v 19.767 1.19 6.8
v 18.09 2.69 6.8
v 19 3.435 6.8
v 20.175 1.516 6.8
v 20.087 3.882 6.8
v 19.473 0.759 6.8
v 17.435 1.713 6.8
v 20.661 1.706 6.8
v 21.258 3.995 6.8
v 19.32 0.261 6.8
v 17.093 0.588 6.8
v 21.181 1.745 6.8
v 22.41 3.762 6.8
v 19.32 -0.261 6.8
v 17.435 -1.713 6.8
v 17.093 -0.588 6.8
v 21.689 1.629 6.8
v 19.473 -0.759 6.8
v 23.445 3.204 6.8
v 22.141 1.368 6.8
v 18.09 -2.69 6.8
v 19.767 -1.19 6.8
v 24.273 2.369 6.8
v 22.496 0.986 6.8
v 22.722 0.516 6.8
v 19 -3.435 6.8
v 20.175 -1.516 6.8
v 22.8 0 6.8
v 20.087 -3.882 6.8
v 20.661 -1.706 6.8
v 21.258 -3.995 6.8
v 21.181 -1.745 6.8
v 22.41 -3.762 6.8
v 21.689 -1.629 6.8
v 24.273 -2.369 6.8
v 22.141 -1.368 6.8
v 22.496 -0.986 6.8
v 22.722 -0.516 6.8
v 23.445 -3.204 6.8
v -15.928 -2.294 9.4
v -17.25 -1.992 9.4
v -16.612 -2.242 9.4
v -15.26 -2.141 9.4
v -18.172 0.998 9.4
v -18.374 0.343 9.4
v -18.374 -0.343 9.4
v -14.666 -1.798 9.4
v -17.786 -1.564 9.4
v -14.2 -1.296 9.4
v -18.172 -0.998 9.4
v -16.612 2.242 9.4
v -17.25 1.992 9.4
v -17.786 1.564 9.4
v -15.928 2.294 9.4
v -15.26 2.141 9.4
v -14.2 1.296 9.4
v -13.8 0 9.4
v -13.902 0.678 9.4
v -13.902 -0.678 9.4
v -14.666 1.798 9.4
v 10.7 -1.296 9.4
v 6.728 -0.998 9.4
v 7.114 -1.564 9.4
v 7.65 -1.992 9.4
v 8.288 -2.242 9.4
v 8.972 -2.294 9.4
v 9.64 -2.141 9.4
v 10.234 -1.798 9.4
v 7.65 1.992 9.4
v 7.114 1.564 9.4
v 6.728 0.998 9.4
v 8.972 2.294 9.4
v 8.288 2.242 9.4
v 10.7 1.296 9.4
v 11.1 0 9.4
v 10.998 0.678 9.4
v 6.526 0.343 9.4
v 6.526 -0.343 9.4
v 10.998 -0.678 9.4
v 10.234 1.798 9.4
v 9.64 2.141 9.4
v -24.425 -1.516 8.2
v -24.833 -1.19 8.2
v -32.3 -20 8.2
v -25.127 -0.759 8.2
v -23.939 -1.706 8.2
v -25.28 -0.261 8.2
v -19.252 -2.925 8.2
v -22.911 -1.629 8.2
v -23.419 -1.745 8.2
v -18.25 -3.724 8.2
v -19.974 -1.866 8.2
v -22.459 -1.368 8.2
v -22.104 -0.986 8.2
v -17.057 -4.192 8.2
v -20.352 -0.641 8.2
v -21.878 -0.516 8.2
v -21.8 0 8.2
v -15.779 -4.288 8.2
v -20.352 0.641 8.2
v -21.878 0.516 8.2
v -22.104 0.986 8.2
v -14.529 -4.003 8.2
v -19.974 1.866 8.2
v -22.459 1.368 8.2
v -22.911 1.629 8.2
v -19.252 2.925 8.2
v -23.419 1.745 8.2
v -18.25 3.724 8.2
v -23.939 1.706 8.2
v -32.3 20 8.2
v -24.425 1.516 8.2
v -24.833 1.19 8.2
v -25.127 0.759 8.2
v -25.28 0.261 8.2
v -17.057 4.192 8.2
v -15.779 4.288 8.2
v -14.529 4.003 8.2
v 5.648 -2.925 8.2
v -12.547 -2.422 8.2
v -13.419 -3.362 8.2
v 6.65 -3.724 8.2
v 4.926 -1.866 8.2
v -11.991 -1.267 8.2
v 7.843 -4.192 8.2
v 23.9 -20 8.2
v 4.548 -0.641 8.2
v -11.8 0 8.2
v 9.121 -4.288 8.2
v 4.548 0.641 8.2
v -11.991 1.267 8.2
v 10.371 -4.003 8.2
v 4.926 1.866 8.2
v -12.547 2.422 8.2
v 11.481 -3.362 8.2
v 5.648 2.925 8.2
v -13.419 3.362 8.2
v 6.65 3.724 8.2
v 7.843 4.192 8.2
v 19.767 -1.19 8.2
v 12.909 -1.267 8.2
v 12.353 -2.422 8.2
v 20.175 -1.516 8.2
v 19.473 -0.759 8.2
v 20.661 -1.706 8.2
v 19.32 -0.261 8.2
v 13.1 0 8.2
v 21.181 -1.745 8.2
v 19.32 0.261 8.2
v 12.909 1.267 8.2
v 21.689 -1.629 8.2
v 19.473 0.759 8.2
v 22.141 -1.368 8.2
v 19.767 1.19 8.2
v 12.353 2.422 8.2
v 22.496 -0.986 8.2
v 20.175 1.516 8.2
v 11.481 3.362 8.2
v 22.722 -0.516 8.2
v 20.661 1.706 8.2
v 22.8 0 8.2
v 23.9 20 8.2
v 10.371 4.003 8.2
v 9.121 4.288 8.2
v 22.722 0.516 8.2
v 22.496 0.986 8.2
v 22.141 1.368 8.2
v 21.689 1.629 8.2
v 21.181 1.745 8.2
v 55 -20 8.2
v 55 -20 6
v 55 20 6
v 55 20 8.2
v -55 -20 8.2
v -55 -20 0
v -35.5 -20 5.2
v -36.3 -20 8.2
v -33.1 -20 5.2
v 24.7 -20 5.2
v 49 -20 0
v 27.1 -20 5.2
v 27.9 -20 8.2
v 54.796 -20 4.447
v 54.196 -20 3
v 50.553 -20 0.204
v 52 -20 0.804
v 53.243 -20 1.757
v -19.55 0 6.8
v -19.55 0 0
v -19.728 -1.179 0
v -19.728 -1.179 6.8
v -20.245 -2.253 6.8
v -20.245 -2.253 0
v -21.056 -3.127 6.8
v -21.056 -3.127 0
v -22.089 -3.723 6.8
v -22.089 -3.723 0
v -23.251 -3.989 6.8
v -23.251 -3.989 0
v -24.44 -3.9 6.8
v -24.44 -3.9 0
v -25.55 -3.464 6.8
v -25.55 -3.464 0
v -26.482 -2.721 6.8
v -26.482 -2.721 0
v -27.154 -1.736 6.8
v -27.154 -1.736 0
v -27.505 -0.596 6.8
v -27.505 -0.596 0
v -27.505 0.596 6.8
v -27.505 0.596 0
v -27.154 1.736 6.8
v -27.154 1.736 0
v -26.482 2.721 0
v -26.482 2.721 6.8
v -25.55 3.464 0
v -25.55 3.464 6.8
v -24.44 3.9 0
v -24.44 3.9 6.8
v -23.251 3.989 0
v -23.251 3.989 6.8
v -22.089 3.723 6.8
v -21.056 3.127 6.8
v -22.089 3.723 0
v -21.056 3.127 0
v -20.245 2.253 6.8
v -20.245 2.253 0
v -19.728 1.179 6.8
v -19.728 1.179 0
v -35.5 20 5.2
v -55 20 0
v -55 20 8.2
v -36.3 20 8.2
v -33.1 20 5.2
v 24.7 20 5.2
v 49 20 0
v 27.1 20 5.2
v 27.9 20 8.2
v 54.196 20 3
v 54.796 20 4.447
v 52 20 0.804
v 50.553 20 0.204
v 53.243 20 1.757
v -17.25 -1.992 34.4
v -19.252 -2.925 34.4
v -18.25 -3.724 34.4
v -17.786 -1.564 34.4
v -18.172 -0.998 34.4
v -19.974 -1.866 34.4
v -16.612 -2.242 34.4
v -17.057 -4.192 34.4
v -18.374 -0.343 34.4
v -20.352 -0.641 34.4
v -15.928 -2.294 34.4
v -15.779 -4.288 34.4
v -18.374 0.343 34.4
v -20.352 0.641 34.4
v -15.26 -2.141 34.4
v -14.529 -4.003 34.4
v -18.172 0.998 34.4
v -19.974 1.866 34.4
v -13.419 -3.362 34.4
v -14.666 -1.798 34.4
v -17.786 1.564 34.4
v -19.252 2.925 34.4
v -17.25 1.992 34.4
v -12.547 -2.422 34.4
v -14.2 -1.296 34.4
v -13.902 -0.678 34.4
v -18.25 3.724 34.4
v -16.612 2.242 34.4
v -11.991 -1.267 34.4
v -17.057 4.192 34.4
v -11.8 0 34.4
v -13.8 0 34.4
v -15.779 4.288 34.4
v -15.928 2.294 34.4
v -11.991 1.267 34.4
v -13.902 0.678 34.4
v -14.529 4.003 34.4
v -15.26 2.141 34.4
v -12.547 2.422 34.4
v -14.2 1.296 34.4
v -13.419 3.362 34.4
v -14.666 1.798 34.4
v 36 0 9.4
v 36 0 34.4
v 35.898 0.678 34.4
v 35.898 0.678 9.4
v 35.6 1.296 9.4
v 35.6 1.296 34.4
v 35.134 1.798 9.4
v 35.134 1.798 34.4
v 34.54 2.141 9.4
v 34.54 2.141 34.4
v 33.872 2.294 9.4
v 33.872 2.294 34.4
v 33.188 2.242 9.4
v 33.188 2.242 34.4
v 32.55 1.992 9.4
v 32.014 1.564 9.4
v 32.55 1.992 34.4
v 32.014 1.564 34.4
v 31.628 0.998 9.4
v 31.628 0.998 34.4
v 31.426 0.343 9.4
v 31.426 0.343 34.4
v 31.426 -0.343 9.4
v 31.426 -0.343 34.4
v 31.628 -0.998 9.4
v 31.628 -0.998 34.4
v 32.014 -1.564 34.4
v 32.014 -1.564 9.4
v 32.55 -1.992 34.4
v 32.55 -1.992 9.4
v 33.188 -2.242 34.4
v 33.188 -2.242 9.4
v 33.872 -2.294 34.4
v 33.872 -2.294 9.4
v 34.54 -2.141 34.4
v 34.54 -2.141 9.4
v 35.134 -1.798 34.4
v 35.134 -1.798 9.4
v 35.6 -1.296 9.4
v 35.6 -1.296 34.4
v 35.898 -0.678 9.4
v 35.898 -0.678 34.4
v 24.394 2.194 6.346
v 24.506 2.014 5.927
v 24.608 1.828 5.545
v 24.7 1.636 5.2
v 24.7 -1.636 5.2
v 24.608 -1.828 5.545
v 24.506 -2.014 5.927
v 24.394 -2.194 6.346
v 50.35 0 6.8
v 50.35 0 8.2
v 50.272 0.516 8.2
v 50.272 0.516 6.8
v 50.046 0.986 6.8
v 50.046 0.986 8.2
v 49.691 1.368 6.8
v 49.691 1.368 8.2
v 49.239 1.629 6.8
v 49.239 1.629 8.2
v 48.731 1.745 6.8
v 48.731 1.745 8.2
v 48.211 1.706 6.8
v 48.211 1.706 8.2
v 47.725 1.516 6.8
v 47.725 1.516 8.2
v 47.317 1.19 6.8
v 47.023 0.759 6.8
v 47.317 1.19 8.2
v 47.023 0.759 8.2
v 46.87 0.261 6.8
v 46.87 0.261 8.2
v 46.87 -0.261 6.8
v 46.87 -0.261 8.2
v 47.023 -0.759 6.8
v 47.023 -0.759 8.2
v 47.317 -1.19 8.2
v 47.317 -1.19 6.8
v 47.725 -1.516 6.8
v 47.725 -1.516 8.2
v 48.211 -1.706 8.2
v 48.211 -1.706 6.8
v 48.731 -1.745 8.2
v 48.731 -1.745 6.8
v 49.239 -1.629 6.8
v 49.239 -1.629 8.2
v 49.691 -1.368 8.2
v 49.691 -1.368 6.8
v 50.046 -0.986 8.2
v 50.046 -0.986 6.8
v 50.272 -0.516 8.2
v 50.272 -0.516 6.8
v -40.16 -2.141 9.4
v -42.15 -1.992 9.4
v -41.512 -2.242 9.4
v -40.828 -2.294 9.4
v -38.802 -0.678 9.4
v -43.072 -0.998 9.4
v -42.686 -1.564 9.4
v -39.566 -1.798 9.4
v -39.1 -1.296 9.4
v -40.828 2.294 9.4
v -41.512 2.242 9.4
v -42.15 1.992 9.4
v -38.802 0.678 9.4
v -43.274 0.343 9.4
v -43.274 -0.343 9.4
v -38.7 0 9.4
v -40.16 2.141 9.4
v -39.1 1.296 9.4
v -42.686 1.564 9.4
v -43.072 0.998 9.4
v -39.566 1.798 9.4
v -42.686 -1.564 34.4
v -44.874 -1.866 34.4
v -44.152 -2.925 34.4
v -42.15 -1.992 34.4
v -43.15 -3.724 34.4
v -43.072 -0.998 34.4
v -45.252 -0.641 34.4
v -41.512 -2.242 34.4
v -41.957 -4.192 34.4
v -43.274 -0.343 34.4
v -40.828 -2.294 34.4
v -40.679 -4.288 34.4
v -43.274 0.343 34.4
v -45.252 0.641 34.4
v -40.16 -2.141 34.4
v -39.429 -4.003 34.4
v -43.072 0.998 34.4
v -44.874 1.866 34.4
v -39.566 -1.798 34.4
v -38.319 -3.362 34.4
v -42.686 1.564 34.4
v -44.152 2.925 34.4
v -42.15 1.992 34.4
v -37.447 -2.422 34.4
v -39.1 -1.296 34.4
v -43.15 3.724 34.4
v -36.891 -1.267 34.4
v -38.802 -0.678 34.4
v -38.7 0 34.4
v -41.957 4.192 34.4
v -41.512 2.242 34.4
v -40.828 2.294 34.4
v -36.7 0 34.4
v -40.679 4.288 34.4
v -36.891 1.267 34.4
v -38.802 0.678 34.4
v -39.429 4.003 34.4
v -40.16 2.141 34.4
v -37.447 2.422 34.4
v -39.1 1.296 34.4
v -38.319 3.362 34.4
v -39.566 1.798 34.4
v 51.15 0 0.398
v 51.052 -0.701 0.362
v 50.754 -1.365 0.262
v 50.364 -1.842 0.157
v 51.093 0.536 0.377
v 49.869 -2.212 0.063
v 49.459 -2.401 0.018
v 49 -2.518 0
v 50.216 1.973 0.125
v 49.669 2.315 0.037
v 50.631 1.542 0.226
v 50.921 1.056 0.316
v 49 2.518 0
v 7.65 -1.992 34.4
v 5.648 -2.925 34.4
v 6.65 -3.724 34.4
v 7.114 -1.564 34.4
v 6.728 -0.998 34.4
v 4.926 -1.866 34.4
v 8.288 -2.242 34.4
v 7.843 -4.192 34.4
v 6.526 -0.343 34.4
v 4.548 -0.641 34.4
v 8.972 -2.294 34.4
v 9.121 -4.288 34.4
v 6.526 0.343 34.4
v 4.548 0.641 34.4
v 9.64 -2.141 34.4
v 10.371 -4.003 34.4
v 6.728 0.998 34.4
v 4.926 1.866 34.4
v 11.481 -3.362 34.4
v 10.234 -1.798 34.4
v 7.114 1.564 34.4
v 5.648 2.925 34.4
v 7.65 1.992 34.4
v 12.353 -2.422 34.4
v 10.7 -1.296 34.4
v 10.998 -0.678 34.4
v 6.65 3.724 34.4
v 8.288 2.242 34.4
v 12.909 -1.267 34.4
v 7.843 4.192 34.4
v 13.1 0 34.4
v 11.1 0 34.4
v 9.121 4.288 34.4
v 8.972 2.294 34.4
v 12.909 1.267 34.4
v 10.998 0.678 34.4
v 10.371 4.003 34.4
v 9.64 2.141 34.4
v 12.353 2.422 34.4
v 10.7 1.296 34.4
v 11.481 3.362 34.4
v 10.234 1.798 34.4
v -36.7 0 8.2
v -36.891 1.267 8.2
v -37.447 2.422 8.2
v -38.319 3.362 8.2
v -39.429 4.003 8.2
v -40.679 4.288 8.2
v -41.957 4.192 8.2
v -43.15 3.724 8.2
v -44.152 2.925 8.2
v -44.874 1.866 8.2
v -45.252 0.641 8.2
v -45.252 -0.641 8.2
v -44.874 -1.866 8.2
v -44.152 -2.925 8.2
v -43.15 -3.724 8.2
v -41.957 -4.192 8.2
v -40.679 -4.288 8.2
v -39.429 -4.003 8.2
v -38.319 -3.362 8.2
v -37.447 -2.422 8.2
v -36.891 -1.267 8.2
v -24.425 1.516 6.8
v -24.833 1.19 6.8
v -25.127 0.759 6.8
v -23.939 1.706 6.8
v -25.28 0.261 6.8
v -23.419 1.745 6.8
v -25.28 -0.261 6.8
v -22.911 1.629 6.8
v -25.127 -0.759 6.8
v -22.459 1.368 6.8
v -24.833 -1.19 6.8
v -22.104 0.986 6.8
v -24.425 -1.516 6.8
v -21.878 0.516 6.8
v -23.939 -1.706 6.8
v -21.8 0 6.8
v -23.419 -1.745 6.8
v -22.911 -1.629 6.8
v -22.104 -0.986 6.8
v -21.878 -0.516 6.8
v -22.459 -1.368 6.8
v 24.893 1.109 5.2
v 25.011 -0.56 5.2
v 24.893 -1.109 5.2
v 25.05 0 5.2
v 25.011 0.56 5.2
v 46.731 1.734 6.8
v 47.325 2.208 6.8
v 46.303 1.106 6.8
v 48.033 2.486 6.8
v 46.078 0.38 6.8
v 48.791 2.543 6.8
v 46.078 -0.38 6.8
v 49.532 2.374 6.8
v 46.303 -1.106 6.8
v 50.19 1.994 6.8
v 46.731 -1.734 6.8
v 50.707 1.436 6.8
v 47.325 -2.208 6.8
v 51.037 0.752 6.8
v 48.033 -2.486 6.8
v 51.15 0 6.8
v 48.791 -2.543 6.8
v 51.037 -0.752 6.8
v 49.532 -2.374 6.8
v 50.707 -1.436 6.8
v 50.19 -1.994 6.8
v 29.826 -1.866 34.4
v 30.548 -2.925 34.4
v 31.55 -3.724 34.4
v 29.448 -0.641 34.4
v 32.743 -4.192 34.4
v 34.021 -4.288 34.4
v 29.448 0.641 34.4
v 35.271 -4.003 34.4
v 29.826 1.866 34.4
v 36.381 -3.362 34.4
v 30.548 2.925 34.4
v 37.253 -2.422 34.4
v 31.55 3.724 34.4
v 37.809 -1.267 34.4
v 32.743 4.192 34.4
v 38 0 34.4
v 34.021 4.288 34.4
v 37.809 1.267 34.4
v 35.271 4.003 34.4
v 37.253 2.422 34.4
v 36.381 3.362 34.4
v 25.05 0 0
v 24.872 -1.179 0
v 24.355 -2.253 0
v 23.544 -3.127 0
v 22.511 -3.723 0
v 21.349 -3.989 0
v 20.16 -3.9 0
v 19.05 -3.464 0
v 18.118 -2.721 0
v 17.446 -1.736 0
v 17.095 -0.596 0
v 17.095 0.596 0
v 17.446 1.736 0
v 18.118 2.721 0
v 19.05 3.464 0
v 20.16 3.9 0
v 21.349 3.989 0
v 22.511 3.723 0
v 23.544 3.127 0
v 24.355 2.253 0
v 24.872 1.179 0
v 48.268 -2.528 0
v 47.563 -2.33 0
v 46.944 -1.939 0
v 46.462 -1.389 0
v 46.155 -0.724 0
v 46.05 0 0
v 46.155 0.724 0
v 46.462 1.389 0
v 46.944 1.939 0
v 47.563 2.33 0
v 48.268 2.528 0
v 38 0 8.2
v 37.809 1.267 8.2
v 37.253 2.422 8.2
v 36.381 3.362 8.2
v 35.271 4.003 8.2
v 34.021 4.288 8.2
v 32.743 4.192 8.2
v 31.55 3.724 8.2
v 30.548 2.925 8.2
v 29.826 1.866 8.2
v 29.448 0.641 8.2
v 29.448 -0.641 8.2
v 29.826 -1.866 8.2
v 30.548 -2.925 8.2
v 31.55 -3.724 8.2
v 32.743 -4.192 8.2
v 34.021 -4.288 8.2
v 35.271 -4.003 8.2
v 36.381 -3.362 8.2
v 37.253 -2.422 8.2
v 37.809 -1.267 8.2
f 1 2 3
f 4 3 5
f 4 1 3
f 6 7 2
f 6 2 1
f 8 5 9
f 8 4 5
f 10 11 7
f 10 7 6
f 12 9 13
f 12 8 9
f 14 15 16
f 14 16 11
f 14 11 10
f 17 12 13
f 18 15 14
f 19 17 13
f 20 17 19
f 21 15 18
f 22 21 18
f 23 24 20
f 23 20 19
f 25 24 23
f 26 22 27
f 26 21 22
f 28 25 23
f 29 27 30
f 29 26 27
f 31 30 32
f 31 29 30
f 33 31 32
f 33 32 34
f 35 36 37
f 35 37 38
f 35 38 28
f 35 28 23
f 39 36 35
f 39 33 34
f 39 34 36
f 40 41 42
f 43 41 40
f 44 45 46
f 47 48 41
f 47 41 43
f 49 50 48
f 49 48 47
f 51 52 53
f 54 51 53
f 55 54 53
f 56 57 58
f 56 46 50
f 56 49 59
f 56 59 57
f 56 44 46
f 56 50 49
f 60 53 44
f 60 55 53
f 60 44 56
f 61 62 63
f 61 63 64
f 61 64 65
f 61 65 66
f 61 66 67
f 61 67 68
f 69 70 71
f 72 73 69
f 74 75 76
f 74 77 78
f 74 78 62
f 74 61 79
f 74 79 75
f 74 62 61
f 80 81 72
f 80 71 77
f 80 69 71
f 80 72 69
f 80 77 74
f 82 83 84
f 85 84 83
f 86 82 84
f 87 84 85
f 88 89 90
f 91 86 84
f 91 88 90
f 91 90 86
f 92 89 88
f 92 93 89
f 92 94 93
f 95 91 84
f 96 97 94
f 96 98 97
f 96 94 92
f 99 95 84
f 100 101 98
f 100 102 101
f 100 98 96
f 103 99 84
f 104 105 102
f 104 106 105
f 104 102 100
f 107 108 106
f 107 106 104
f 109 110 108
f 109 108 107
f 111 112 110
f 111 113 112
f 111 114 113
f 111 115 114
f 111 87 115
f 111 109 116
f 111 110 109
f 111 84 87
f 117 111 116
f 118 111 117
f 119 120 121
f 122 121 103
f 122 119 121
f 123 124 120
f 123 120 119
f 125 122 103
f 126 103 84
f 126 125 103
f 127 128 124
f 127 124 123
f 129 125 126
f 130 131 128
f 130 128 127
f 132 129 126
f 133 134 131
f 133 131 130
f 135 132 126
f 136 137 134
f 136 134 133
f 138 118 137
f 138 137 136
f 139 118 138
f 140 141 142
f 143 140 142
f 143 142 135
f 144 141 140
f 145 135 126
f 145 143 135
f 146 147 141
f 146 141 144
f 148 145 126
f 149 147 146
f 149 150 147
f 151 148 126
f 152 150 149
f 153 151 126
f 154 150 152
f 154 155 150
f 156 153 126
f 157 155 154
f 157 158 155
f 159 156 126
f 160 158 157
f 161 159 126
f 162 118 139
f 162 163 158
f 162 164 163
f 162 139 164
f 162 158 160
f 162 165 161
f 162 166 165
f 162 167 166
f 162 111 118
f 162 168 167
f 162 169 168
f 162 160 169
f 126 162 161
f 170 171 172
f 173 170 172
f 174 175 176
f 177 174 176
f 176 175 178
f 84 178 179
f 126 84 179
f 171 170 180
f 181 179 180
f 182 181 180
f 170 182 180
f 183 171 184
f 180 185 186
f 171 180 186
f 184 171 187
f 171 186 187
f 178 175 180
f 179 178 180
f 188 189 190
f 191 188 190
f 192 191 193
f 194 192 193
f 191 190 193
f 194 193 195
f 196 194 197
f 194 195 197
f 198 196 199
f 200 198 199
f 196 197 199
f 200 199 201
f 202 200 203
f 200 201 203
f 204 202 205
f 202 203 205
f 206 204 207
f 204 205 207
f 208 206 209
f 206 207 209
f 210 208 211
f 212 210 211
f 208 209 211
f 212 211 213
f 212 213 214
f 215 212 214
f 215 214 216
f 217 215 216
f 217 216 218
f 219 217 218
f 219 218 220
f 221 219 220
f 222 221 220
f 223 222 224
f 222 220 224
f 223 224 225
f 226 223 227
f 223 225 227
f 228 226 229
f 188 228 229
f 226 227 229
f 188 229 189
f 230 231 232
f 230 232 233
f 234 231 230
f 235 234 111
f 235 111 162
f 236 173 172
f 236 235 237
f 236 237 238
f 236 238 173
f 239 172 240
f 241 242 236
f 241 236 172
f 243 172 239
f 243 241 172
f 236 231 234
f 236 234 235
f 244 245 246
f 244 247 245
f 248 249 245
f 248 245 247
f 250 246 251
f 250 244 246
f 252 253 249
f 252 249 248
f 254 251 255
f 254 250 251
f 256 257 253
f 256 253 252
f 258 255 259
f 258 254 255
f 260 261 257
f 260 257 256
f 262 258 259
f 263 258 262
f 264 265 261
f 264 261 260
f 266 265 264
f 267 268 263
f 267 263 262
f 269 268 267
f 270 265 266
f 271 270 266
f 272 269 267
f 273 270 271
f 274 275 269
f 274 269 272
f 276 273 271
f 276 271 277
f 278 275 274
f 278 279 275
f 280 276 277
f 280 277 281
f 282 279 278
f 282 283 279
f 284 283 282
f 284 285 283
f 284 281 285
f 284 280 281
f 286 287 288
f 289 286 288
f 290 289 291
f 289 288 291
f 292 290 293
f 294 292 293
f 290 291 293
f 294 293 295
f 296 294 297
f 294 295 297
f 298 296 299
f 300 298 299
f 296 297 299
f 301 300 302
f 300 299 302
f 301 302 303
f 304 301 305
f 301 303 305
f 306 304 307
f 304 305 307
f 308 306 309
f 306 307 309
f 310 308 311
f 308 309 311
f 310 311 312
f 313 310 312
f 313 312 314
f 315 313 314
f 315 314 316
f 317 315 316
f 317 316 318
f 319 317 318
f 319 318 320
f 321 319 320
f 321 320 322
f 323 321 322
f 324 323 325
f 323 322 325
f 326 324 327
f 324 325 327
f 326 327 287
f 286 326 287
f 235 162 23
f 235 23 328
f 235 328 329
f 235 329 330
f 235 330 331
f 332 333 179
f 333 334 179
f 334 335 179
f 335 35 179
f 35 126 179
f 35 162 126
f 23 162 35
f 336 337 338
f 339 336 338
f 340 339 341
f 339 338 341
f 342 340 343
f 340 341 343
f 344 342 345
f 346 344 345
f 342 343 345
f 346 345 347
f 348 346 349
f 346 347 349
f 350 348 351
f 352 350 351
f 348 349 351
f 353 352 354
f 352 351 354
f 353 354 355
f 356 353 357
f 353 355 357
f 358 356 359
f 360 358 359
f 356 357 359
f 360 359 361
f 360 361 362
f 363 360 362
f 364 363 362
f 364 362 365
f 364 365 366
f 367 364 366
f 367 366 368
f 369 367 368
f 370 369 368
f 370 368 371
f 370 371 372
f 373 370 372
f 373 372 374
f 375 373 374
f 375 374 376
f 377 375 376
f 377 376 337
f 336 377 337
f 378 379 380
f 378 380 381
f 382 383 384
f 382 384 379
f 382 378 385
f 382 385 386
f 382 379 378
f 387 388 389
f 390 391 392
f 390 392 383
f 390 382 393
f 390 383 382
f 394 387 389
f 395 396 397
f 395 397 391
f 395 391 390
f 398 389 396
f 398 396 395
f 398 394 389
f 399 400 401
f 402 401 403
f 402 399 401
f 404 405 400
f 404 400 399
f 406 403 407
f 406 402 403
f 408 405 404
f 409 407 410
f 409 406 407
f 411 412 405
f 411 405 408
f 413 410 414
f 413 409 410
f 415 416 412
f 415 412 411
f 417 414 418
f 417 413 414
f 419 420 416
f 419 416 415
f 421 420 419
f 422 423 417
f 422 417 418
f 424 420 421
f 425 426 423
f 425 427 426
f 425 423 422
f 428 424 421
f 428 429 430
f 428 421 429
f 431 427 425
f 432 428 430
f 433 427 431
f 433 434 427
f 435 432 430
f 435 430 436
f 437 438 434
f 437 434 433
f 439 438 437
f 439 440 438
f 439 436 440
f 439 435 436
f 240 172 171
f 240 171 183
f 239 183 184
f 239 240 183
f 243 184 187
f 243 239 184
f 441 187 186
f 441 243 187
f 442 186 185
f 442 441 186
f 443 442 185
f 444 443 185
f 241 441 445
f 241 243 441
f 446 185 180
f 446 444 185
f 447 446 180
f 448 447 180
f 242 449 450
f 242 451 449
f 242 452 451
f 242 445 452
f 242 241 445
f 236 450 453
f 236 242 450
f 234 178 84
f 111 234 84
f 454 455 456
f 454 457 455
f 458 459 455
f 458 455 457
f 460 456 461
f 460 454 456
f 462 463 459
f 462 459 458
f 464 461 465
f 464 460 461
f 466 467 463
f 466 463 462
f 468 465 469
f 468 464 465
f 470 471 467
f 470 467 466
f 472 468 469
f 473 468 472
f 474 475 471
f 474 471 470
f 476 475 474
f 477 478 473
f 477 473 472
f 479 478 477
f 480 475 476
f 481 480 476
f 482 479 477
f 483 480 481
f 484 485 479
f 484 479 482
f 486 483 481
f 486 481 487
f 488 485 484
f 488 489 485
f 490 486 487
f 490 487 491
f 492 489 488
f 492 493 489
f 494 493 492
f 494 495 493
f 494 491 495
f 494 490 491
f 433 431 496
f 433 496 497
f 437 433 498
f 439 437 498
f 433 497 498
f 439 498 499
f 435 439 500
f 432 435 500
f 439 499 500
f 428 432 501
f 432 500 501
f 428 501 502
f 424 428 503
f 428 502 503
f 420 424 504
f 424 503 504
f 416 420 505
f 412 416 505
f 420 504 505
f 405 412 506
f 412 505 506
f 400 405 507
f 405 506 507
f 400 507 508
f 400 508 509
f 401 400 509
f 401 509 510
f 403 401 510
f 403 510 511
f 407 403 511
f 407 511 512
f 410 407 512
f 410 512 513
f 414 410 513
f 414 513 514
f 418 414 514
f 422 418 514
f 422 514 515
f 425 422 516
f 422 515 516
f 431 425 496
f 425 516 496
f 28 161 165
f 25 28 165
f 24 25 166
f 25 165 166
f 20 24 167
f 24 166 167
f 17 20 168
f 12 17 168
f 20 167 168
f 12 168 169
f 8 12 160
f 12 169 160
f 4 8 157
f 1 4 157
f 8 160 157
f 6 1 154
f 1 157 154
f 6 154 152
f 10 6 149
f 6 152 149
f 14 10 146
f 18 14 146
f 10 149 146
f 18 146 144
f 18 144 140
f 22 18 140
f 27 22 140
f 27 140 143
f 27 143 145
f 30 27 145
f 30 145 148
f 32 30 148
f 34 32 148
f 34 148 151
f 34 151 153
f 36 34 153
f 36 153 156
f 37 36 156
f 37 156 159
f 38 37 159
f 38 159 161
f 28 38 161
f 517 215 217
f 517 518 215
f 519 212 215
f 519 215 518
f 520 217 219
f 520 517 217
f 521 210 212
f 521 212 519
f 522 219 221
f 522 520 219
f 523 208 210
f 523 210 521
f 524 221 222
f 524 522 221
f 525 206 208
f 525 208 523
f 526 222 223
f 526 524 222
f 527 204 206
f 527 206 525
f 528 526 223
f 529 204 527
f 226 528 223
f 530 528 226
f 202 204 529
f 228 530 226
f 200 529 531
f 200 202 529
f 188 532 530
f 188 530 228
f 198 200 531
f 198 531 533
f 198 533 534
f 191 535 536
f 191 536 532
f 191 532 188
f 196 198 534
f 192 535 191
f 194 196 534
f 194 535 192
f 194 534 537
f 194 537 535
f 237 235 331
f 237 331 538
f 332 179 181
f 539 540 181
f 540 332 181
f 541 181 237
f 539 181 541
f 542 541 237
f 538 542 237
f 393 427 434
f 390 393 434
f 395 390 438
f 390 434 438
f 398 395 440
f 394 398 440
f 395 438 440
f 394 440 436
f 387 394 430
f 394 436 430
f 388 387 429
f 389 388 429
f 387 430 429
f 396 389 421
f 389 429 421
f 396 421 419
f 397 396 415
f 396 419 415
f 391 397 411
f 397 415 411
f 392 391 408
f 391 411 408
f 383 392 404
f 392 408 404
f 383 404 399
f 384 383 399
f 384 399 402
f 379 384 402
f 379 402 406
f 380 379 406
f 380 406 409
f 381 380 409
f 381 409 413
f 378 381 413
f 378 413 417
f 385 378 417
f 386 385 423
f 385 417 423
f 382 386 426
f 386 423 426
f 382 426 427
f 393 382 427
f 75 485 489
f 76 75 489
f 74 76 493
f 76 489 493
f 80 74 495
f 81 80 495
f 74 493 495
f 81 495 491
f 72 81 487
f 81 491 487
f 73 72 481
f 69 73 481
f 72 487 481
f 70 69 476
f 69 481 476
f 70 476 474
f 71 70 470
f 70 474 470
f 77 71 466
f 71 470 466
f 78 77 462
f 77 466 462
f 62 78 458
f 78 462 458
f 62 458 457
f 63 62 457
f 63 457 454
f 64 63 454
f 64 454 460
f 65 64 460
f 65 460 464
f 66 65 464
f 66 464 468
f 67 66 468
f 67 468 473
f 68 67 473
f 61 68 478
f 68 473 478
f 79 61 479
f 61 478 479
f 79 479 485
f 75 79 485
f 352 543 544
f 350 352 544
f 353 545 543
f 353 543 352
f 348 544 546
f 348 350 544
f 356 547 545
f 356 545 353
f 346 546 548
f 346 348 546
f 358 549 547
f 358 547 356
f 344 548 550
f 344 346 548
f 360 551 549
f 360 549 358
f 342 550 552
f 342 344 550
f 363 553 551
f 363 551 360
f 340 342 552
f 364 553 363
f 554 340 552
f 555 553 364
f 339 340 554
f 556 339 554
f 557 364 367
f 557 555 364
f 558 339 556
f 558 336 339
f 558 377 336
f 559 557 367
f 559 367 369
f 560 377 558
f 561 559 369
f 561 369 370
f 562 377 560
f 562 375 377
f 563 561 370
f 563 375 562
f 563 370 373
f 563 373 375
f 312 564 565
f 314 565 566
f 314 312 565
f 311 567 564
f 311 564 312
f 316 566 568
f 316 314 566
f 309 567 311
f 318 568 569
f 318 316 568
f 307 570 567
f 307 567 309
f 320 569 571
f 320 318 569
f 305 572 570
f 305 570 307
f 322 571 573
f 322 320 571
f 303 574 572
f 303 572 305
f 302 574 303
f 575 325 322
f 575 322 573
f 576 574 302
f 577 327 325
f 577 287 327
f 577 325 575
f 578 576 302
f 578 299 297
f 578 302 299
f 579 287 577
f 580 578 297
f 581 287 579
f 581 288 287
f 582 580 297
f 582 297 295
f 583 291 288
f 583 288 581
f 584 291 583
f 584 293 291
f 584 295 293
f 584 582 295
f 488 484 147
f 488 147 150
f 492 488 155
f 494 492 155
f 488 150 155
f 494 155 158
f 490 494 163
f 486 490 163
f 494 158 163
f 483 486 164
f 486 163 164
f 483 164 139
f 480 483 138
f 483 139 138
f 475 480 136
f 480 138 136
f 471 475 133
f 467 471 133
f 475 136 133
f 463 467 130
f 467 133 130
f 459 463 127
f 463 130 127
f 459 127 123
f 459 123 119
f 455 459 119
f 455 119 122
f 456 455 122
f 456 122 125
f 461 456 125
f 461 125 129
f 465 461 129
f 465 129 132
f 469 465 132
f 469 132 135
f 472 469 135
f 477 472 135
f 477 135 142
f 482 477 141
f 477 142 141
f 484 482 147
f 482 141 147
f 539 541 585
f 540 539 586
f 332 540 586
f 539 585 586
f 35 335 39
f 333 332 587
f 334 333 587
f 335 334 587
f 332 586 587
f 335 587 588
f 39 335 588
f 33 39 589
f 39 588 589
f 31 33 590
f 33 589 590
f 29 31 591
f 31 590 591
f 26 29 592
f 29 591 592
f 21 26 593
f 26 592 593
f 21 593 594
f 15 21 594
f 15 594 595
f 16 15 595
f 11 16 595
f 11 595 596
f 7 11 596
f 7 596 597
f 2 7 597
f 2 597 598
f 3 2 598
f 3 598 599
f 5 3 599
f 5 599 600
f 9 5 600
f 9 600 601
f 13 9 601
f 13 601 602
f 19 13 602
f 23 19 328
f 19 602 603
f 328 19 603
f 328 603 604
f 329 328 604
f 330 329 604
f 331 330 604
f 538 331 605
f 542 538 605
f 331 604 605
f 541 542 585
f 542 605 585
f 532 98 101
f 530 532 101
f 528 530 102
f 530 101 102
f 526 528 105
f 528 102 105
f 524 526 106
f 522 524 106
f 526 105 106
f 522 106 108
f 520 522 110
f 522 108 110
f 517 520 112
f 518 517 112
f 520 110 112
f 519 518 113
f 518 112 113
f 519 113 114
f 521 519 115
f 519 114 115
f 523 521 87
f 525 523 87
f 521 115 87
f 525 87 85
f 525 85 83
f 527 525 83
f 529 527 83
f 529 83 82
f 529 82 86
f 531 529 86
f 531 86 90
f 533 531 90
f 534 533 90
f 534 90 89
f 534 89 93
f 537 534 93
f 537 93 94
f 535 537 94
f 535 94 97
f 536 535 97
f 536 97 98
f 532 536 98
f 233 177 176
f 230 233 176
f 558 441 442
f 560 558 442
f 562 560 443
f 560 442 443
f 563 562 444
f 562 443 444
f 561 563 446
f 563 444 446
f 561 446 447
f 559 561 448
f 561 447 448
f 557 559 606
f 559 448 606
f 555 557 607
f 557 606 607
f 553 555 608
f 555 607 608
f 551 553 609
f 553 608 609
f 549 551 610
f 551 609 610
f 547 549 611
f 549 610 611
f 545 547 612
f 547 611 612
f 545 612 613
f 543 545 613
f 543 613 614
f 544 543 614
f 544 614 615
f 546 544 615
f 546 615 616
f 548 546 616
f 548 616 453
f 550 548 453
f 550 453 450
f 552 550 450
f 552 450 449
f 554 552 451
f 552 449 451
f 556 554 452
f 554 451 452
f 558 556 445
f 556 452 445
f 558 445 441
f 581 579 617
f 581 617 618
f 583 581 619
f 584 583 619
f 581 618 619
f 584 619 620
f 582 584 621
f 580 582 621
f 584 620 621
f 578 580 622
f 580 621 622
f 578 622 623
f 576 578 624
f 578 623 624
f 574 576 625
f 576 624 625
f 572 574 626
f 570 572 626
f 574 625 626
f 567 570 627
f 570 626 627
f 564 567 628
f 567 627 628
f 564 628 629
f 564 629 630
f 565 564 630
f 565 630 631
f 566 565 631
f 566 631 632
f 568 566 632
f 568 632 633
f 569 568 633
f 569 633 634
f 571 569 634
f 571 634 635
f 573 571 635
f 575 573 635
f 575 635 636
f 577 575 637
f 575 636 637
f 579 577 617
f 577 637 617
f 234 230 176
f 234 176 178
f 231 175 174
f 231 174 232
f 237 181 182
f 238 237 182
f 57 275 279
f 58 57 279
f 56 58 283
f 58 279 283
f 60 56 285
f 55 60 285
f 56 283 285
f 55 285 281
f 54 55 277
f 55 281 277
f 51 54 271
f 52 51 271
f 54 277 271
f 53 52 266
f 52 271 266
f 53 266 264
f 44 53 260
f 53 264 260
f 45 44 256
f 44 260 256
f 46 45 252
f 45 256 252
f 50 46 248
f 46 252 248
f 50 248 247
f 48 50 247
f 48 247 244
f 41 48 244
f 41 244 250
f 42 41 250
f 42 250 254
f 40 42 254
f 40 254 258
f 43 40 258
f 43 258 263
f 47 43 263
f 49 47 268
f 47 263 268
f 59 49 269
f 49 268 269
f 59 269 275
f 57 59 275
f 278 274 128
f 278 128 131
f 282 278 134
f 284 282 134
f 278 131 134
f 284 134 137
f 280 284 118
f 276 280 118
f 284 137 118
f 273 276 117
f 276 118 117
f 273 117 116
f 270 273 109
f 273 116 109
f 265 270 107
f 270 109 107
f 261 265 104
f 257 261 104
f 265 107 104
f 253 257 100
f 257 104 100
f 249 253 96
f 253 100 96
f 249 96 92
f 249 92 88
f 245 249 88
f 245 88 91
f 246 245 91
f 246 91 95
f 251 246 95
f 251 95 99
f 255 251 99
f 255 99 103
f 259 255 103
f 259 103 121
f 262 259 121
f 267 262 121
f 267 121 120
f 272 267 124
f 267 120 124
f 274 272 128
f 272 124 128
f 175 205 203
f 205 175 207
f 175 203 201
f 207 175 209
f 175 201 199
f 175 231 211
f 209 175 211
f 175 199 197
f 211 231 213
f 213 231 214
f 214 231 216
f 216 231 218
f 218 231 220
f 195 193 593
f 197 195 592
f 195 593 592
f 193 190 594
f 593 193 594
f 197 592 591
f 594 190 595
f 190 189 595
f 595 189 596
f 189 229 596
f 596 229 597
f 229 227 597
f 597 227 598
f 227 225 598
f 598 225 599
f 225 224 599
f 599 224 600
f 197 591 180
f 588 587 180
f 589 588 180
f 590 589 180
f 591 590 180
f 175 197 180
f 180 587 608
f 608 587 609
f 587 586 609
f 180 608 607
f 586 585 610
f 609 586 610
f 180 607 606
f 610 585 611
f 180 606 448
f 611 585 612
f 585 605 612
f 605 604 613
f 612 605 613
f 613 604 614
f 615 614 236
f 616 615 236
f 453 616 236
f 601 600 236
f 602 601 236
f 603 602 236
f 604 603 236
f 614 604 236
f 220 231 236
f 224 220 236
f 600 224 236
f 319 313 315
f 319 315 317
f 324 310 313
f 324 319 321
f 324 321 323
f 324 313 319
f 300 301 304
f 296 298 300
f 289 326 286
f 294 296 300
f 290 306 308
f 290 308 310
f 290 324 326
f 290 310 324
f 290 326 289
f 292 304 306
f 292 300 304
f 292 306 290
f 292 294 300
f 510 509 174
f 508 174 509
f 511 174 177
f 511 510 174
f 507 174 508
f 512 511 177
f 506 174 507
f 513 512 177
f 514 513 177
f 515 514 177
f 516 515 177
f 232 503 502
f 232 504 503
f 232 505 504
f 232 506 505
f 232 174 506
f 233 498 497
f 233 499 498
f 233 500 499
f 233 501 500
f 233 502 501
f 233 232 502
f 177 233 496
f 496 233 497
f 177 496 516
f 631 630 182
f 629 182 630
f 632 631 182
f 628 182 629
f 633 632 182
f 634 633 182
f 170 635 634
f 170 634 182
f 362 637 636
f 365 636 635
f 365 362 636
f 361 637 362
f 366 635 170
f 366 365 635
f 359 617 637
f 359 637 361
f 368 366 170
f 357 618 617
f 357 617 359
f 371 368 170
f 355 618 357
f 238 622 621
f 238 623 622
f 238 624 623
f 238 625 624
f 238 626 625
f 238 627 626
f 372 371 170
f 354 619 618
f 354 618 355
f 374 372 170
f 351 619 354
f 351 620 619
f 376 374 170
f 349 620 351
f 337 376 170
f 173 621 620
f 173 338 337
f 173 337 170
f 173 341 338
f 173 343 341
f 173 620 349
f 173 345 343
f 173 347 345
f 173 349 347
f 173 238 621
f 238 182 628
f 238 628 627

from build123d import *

# Parameters (mm, degrees)
F0_W      = 110
F0_H      = 40
F1_DEPTH  = 8.2
F2_R      = 6
F3_R      = 4.3
F4_DEPTH  = 26.2
F5_R      = 2.55
F5_R_2    = 4
F6_DEPTH  = 6.8
F7_R      = 1.75
F8_DEPTH  = 8.201
F10_DEPTH = 40.001
F11_R     = 2.3
F12_DEPTH = 25


with BuildPart() as f1:
    # F0 (on Top) → F1 (new body)
    with BuildSketch(Plane.XY):
        Rectangle(F0_W, F0_H)
    extrude(amount=F1_DEPTH)

    # F2
    f2_edges = [f1.edges().sort_by_distance(p)[0] for p in [
        (55, 0, 0),
    ]]
    fillet(f2_edges, radius=F2_R)

    # F3 (on face) → F4 (join)
    with BuildSketch(Plane.XY.offset(8.2)):
        with Locations((-41, 0)):
            Circle(F3_R)
        with Locations((-16.1, 0)):
            Circle(F3_R)
        with Locations((8.8, 0)):
            Circle(F3_R)
        with Locations((33.7, 0)):
            Circle(F3_R)
    extrude(amount=F4_DEPTH)

    # F5 (on face) → F6 (cut)
    with BuildSketch(Plane(origin=(0, 0, 0), x_dir=(1, 0, 0), z_dir=(0, 0, -1))):
        with Locations((48.6, 0)):
            Circle(F5_R)
        with Locations((21.05, 0)):
            Circle(F5_R_2)
        with Locations((-23.55, 0)):
            Circle(F5_R_2)
    extrude(amount=-F6_DEPTH, mode=Mode.SUBTRACT)

    # F7 (on face) → F8 (cut, through all)
    with BuildSketch(Plane.XY.offset(8.2)):
        with Locations((48.6, 0)):
            Circle(F7_R)
        with Locations((21.05, 0)):
            Circle(F7_R)
        with Locations((-23.55, 0)):
            Circle(F7_R)
    extrude(amount=-F8_DEPTH, mode=Mode.SUBTRACT)

    # F9 (on face) → F10 (cut, through all)
    with BuildSketch(Plane.XZ.offset(20)):
        Polygon((-32.3, 8.2), (-36.3, 8.2), (-35.5, 5.2), (-33.1, 5.2), align=None)
        Polygon((27.9, 8.2), (23.9, 8.2), (24.7, 5.2), (27.1, 5.2), align=None)
    extrude(amount=-F10_DEPTH, mode=Mode.SUBTRACT)

    # F11 (on face) → F12 (cut)
    with BuildSketch(Plane.XY.offset(34.4)):
        with Locations((-41, 0)):
            Circle(F11_R)
        with Locations((-16.1, 0)):
            Circle(F11_R)
        with Locations((8.8, 0)):
            Circle(F11_R)
        with Locations((33.7, 0)):
            Circle(F11_R)
    extrude(amount=-F12_DEPTH, mode=Mode.SUBTRACT)


solid = f1.part
